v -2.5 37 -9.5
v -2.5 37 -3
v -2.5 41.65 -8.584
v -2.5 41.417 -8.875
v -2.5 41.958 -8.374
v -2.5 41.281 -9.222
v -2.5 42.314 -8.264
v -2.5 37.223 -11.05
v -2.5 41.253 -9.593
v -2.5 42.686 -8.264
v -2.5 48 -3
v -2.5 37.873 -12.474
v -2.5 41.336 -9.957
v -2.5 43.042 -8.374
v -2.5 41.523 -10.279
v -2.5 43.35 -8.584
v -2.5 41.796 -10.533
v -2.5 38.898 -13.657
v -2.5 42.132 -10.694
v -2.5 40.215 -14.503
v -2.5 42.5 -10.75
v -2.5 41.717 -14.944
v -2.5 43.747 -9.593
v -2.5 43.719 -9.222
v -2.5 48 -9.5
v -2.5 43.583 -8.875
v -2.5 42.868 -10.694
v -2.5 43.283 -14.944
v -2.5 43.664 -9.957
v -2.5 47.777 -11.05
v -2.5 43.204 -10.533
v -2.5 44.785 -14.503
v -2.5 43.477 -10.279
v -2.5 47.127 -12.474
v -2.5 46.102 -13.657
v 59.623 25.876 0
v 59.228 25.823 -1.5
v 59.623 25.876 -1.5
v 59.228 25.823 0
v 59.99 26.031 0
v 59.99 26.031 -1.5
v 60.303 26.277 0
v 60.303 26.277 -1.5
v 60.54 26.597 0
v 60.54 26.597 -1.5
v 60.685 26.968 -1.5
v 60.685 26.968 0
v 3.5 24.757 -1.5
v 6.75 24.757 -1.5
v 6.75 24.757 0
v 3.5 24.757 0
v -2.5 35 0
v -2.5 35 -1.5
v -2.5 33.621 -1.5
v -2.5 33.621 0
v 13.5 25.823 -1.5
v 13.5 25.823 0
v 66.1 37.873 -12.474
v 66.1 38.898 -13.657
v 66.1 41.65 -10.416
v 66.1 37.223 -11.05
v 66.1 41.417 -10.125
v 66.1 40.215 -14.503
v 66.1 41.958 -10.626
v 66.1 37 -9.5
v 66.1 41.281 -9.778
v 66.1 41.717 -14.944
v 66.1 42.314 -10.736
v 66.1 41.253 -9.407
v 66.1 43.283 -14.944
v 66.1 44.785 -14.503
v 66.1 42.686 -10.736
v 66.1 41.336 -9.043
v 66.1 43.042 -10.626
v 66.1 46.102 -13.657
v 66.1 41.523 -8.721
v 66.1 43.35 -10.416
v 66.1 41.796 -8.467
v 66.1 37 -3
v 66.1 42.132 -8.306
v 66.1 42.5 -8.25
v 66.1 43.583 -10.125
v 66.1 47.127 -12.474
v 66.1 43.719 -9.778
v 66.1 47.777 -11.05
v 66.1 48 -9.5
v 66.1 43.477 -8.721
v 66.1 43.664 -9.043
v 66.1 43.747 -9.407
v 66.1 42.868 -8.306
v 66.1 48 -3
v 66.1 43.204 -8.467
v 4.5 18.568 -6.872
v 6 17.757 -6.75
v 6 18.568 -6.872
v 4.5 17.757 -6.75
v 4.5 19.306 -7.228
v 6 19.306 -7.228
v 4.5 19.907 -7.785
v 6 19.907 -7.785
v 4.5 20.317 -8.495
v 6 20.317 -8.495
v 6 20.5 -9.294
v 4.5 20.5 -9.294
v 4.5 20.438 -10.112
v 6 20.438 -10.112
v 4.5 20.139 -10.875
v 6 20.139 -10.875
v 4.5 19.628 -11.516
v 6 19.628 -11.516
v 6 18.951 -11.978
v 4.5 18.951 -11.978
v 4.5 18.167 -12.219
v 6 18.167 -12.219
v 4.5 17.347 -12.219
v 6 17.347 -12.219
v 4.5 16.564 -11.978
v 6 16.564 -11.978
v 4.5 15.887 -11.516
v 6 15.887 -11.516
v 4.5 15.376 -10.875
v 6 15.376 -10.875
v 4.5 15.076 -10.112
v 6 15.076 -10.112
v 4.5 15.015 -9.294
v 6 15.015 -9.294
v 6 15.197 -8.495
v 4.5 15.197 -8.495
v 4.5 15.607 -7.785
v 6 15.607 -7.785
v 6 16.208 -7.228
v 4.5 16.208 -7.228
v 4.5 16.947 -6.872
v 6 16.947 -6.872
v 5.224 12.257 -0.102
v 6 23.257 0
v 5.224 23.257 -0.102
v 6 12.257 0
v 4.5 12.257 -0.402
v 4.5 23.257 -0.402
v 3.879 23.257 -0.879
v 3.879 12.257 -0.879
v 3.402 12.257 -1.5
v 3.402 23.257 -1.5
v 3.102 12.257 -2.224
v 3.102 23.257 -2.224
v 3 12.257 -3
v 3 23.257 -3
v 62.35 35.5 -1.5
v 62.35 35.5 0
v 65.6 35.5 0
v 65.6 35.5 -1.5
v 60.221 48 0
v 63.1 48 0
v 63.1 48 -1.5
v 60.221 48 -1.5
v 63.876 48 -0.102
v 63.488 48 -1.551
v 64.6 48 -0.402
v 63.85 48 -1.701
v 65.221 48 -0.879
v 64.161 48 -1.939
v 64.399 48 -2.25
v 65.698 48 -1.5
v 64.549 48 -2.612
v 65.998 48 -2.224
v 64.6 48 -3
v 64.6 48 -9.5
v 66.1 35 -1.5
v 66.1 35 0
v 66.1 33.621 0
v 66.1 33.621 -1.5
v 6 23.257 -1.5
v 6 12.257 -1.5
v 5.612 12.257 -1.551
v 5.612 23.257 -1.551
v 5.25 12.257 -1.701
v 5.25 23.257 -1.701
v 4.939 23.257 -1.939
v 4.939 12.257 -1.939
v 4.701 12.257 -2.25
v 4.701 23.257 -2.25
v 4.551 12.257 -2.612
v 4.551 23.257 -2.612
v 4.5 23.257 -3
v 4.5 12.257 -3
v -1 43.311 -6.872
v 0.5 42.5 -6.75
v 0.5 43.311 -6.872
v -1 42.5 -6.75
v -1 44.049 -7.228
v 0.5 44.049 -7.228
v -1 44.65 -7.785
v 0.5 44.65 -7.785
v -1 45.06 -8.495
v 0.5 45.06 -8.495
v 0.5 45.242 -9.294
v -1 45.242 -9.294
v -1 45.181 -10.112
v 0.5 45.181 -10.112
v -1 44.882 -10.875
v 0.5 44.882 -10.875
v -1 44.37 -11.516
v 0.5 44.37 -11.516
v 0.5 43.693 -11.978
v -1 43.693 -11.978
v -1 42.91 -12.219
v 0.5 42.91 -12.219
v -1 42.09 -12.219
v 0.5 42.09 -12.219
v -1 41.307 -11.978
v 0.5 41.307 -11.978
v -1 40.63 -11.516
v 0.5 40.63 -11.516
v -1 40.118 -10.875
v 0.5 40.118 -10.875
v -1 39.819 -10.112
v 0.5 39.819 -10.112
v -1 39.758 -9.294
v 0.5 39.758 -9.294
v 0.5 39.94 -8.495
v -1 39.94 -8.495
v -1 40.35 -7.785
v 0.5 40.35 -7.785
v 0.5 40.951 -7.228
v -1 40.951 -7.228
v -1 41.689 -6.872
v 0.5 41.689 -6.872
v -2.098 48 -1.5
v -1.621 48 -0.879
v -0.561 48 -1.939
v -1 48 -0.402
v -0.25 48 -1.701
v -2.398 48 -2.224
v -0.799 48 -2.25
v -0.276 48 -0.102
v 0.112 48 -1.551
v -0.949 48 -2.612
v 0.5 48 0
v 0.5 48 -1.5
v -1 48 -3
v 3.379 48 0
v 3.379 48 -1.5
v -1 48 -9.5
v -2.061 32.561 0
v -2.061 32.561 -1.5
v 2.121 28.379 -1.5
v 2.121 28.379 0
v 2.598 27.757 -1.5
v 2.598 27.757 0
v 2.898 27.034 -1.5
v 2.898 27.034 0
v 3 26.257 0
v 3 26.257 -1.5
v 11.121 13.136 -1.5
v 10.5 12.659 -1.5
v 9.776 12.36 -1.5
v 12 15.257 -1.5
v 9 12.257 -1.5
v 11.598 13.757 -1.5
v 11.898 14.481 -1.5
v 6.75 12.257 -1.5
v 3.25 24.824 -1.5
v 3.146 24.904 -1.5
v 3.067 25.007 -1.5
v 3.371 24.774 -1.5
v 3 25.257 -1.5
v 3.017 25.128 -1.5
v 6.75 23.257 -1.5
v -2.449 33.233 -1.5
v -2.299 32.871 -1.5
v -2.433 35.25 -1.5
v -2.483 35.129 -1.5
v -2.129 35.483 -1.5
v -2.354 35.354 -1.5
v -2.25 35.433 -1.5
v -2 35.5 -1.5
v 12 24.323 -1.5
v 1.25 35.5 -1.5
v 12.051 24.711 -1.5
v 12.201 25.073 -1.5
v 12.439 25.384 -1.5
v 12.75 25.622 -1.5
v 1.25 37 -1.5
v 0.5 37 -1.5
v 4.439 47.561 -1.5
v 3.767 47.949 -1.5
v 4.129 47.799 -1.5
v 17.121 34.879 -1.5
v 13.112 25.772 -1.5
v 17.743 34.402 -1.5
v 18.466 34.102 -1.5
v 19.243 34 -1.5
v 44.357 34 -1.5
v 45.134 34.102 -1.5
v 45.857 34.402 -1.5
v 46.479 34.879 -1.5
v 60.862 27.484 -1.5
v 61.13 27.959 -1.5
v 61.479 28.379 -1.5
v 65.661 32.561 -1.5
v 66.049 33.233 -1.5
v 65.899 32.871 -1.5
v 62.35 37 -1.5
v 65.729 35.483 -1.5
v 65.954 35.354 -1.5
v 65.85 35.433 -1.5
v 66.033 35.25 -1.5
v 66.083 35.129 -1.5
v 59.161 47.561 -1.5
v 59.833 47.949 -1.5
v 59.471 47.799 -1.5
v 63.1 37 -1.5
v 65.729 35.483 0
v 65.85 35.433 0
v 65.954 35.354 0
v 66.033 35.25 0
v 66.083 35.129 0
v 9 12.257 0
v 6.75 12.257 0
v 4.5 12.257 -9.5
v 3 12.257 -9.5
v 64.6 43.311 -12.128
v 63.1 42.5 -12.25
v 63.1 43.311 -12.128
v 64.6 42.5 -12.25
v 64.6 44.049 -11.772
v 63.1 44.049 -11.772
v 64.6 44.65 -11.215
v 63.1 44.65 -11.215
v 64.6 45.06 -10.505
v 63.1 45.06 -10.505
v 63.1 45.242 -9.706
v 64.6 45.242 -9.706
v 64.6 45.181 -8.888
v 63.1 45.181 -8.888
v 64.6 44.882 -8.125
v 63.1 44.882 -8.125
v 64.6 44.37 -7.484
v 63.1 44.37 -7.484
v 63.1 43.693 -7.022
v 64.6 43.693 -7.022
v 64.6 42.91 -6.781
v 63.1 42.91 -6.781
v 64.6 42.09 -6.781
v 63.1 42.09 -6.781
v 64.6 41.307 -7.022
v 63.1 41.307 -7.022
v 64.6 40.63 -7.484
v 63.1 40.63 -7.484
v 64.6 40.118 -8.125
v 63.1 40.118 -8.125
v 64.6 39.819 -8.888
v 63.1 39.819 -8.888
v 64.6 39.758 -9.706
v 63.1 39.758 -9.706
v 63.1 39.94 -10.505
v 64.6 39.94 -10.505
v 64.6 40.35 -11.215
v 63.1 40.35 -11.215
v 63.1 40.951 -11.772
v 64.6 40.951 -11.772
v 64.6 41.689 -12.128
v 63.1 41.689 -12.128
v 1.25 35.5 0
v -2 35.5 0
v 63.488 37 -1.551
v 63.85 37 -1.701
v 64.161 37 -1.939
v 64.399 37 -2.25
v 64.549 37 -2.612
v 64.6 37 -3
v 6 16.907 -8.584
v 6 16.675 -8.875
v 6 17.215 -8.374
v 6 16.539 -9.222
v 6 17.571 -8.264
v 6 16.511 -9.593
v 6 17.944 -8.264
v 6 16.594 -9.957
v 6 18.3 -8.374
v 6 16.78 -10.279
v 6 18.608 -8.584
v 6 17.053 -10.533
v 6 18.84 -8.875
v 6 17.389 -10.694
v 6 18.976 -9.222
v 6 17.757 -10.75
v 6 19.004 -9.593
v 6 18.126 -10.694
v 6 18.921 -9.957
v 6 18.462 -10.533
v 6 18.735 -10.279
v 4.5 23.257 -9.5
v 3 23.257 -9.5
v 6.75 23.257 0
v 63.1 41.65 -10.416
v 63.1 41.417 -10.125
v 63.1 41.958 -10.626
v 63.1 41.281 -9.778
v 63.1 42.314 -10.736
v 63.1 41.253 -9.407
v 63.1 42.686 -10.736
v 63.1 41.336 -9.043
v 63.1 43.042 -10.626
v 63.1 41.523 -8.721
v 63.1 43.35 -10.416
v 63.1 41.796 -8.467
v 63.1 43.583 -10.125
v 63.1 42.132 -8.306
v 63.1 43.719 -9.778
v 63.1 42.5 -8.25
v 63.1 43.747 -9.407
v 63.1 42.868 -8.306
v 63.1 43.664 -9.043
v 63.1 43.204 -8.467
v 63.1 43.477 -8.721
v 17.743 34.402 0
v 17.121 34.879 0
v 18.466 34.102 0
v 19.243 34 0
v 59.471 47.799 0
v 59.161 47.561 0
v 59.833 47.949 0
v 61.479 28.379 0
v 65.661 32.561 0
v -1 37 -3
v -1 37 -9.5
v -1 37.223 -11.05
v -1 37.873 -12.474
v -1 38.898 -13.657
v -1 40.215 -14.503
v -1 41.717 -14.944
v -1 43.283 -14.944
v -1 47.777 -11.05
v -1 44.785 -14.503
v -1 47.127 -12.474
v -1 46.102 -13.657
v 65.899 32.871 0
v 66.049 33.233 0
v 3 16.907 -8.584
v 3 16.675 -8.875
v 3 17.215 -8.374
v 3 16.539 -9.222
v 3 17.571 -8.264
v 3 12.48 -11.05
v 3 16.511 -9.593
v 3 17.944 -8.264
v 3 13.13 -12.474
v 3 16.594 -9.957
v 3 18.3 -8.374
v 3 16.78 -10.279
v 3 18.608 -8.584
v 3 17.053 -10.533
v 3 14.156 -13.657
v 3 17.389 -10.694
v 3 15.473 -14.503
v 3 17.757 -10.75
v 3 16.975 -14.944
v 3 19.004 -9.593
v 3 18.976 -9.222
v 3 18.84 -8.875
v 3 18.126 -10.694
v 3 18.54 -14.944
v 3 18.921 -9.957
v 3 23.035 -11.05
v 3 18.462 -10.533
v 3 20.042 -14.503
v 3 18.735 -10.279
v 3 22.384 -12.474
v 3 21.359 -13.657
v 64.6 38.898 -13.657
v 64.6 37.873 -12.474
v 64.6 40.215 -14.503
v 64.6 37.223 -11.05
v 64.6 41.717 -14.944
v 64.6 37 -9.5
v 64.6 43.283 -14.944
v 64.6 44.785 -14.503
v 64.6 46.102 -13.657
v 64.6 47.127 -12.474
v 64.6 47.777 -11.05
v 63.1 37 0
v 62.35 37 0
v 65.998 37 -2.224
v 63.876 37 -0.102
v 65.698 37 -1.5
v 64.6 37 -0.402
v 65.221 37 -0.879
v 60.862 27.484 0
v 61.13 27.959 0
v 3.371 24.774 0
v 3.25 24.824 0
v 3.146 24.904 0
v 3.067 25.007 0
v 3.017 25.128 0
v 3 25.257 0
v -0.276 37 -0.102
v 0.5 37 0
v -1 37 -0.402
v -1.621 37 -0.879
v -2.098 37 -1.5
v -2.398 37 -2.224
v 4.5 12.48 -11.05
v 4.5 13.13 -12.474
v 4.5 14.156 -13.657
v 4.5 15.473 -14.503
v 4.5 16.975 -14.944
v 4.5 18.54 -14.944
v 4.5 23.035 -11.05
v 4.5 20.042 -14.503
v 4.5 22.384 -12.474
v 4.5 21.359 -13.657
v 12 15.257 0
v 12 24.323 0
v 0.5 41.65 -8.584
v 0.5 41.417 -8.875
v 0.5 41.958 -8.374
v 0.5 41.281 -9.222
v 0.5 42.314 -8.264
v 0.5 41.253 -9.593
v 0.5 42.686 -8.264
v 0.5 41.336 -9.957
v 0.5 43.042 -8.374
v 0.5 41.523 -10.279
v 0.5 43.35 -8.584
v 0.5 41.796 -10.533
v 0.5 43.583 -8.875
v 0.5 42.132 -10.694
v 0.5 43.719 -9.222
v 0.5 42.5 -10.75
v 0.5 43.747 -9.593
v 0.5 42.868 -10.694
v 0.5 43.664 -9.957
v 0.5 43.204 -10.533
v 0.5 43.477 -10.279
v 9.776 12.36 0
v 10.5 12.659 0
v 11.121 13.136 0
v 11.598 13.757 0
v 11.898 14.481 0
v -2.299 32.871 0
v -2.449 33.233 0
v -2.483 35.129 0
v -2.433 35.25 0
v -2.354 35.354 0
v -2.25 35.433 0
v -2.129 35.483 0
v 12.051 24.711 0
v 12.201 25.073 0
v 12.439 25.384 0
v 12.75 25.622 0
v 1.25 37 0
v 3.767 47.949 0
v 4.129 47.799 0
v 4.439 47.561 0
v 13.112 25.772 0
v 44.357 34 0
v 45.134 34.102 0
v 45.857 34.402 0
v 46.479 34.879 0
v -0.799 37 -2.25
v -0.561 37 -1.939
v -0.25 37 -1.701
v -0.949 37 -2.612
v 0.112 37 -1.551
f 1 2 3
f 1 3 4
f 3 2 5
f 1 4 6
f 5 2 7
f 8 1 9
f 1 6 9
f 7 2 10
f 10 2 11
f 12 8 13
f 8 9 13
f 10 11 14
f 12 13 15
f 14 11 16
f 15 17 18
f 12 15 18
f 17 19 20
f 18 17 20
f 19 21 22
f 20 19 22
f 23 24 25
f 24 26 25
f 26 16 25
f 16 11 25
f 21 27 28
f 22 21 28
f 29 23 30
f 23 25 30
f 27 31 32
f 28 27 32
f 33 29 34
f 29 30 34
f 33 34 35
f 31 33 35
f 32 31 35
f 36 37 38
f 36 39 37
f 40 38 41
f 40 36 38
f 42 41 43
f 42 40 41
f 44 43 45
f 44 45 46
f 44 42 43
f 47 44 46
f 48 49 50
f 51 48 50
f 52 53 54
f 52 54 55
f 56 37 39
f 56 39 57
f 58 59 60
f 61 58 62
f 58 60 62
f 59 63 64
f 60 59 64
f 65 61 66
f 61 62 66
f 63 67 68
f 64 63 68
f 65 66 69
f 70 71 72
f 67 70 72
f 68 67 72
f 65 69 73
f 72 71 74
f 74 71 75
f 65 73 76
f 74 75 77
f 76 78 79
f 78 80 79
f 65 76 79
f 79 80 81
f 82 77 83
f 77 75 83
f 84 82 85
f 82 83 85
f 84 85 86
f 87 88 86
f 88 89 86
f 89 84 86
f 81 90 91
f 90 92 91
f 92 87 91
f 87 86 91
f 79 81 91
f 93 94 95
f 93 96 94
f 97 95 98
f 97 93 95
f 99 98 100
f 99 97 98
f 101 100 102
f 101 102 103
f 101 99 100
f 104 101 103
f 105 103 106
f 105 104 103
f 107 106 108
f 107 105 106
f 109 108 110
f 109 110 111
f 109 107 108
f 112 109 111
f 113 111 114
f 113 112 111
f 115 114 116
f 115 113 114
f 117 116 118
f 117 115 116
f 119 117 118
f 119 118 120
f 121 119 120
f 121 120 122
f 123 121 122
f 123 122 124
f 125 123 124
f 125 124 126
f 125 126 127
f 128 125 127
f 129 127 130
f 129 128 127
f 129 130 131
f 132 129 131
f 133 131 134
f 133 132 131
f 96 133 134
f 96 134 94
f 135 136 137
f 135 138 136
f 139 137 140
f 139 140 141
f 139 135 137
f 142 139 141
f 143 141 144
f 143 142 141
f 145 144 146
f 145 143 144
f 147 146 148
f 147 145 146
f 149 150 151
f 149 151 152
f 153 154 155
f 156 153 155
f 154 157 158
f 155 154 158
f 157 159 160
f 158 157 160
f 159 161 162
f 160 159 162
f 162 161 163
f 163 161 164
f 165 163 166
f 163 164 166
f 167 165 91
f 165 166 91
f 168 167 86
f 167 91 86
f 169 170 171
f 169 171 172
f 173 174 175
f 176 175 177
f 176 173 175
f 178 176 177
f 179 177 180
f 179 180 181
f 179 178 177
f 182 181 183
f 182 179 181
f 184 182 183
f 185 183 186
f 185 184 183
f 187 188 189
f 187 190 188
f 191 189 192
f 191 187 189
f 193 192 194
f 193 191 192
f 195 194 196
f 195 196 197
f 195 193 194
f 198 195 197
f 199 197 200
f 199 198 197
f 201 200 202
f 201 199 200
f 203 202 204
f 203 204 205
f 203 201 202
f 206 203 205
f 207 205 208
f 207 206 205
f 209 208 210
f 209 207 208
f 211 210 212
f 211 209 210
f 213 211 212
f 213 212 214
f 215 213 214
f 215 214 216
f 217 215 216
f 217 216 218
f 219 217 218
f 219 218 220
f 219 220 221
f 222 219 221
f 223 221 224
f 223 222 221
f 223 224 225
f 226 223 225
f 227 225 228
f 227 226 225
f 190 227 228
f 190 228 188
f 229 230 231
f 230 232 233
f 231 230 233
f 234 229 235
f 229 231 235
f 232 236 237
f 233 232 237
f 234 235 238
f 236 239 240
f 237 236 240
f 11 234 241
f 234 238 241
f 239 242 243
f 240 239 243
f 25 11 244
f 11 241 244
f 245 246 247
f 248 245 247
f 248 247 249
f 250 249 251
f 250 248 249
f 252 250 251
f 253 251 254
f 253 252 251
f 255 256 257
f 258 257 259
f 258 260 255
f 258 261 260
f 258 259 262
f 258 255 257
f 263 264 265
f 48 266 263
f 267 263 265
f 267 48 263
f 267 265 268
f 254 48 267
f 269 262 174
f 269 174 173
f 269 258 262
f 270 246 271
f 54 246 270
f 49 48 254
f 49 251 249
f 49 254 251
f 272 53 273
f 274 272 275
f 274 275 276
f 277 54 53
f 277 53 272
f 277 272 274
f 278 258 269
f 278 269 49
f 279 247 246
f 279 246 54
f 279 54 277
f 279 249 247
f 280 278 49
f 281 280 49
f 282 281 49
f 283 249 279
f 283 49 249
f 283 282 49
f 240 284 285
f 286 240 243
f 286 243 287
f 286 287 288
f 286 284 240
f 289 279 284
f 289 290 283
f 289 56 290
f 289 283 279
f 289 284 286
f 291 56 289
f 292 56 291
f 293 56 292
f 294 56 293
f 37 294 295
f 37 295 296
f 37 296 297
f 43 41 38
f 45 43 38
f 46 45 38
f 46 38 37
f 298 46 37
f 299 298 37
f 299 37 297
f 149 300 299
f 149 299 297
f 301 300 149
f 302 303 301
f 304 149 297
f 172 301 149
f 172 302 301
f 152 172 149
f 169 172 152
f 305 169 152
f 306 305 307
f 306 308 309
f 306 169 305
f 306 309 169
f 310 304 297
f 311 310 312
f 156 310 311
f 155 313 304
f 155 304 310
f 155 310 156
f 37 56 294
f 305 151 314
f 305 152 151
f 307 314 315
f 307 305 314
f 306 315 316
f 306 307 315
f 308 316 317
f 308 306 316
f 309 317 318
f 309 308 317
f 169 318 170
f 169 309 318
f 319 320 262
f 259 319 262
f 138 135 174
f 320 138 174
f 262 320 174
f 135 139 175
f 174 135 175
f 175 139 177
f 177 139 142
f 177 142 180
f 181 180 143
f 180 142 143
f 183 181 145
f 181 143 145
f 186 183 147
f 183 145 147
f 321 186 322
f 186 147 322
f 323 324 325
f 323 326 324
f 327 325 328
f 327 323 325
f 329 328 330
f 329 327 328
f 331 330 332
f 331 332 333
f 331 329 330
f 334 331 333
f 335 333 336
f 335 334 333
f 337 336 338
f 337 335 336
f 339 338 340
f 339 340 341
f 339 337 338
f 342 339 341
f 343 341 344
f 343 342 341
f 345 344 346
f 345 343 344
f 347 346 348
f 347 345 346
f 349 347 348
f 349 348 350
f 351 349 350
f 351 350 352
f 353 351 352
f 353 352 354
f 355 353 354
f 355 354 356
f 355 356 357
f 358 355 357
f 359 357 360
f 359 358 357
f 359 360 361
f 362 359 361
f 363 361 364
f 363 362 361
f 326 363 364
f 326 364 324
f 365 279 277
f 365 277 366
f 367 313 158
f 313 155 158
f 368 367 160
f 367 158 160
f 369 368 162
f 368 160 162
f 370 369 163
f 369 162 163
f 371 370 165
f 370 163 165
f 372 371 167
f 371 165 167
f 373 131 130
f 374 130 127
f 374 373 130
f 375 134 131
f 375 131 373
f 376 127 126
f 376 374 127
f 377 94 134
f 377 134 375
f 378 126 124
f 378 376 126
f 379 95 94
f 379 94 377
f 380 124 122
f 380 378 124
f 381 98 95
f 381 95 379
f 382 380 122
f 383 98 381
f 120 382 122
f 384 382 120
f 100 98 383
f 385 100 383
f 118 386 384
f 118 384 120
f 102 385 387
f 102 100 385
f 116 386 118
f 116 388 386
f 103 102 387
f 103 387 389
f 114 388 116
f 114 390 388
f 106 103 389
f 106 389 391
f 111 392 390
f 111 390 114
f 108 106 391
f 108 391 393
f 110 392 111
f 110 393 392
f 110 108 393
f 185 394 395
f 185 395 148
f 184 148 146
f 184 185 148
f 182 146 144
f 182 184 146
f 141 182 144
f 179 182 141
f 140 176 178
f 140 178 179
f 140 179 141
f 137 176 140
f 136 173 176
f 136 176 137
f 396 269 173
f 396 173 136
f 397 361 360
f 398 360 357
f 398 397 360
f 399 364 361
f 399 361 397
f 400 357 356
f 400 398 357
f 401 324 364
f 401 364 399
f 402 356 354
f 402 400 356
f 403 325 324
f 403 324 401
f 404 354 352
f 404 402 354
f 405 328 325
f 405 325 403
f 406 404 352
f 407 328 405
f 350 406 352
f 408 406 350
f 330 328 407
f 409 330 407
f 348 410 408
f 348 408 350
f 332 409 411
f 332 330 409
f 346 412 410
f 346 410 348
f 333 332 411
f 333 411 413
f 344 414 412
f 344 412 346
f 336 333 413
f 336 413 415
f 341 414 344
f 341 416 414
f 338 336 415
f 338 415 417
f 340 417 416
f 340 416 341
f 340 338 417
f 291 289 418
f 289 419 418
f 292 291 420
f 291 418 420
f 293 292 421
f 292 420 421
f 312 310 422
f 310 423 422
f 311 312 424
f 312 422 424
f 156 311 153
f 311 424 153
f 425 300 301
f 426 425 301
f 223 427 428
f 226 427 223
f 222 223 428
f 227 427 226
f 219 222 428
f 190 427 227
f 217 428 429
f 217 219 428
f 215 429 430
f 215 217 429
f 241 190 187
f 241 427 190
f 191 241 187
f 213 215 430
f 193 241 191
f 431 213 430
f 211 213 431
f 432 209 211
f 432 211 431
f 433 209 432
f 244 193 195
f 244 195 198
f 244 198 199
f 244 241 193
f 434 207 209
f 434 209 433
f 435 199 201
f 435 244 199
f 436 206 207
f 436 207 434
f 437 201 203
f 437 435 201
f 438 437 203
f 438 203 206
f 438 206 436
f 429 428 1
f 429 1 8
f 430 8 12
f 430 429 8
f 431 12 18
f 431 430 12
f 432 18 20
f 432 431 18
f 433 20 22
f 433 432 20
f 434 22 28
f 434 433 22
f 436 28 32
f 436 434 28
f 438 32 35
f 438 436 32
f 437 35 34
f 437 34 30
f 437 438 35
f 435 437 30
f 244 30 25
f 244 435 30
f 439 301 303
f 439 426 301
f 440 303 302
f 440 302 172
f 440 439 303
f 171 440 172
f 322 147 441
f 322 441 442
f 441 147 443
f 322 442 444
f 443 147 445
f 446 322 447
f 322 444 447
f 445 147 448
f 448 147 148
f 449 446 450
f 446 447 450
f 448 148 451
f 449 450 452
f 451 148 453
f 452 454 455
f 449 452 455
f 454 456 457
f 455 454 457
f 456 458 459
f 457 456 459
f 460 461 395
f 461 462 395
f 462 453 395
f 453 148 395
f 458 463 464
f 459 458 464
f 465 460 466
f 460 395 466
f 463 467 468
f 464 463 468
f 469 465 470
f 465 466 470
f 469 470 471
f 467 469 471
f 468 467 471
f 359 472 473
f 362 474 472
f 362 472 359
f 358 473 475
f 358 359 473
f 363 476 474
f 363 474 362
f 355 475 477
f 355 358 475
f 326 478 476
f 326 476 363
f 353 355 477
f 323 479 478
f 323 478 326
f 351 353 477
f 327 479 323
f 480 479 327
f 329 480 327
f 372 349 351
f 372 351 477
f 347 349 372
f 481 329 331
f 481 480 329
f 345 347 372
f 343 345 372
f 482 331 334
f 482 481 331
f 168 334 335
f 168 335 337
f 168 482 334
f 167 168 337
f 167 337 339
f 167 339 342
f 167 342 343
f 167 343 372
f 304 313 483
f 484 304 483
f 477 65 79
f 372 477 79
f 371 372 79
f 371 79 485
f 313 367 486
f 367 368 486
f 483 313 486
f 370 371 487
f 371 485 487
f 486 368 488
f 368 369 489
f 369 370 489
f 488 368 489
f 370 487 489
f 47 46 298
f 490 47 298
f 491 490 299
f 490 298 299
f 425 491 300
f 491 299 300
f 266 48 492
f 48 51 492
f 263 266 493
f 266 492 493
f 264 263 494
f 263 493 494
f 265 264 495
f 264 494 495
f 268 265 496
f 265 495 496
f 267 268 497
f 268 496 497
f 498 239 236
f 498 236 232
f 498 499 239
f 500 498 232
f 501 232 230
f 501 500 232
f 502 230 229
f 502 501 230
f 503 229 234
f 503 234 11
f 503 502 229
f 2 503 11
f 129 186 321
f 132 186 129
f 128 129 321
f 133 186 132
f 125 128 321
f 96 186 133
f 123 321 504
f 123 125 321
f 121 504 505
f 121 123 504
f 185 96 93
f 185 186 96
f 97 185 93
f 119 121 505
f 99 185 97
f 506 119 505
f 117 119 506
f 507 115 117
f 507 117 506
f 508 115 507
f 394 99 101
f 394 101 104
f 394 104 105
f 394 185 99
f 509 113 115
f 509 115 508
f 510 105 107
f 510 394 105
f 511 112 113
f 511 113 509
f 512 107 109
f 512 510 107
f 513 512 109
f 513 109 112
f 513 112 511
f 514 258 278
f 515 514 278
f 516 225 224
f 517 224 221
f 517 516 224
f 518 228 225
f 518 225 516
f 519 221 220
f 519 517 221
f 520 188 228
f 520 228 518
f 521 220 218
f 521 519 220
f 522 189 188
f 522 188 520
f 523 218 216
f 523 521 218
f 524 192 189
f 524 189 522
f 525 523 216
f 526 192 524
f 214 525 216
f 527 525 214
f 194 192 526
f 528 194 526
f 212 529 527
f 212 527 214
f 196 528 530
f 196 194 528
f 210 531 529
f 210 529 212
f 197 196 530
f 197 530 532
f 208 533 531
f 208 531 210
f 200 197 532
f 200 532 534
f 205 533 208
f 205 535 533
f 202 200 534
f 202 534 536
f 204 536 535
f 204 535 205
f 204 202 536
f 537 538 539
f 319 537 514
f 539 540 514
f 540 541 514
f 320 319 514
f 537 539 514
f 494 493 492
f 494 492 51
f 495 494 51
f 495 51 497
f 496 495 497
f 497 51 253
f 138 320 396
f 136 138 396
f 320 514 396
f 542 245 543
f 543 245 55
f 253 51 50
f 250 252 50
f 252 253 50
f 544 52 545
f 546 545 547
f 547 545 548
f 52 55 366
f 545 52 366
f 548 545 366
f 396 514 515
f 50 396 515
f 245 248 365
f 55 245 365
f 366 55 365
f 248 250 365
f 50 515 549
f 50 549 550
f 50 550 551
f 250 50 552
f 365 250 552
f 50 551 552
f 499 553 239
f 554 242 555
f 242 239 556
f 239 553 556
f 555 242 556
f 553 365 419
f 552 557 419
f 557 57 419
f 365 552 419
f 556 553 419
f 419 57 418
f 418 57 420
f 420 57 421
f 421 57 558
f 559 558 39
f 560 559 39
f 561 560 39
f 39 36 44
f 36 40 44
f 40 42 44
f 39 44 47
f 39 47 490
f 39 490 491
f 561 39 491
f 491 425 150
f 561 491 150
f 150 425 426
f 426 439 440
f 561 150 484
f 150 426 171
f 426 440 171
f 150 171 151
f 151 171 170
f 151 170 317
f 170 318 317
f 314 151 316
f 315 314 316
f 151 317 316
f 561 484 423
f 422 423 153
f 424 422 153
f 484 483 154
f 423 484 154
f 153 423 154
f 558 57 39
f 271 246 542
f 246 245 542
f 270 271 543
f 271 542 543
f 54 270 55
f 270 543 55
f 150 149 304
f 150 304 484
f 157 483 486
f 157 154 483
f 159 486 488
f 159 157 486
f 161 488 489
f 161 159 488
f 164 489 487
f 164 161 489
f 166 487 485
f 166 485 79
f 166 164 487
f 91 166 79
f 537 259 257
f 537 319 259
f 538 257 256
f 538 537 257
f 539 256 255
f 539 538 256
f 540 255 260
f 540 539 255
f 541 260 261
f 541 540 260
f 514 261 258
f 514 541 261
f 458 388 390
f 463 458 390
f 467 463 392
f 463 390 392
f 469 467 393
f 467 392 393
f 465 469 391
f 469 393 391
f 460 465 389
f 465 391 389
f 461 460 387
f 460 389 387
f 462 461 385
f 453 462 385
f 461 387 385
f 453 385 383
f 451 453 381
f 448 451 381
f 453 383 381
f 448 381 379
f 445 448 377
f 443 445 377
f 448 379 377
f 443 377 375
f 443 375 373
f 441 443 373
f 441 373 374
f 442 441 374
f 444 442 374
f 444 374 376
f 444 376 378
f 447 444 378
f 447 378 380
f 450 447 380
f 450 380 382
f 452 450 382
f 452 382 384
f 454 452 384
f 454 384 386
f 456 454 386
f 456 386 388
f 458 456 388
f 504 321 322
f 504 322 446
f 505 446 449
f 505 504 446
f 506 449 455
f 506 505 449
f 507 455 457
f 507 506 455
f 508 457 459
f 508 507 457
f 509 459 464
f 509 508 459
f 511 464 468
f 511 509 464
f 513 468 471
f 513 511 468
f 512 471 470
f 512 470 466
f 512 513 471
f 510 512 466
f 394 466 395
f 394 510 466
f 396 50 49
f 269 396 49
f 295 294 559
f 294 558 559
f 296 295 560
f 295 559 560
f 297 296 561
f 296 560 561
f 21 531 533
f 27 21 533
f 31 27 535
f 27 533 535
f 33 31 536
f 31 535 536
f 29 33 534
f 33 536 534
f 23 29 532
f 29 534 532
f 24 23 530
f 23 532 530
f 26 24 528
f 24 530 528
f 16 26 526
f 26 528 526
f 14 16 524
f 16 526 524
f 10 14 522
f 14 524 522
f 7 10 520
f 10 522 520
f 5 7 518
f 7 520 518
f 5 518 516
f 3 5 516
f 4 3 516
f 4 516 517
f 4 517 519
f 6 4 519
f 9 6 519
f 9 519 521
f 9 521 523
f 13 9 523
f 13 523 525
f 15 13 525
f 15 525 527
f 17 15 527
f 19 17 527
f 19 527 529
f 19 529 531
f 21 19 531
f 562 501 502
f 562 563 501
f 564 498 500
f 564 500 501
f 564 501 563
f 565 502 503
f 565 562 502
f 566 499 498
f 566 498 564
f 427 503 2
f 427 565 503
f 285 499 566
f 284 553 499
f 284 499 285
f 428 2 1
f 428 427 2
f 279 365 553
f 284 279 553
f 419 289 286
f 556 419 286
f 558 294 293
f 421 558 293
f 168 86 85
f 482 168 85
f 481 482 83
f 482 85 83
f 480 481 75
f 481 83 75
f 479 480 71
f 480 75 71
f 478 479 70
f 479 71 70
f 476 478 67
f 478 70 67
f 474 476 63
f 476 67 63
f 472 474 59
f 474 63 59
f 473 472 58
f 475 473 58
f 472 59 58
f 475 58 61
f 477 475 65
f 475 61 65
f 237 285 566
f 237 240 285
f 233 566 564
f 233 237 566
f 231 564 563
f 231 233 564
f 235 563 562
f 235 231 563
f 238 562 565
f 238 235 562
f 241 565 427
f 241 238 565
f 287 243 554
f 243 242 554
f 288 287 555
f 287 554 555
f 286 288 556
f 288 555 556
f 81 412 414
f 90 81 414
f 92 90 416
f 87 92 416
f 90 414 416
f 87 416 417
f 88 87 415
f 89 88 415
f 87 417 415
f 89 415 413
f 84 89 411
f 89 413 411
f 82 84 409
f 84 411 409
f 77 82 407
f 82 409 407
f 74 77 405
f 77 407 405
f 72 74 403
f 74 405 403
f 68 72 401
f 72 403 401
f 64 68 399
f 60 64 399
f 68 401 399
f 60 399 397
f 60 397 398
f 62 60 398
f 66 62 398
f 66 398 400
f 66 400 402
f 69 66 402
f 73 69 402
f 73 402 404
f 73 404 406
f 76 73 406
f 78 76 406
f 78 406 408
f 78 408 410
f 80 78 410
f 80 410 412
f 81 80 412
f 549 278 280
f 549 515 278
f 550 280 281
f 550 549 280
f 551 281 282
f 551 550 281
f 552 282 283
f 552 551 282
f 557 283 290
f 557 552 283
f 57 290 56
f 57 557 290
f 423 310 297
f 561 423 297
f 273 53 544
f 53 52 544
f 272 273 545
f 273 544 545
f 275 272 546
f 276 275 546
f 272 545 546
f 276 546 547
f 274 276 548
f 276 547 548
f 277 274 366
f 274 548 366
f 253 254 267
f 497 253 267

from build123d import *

# Parameters (mm, degrees)
SKETCH_1_W                  = 5.5
SKETCH_1_H                  = 12.242640687
EXTRUDE_1_DEPTH             = 1.5
SKETCH_2_W                  = 1.5
SKETCH_2_H                  = 24.742640687
EXTRUDE_2_DEPTH             = 55.6
SKETCH_3_W                  = 1.5
SKETCH_3_H                  = 11
EXTRUDE_3_DEPTH             = 2.25
SKETCH_4_W                  = 63.35
SKETCH_4_H                  = 1.5
EXTRUDE_4_DEPTH             = 11
EXTRUDE_5_DEPTH             = 1.5
EXTRUDE_6_DEPTH             = 1.5
SKETCH_7_W                  = 1.5
SKETCH_7_H                  = 11
EXTRUDE_7_DEPTH             = 2.25
EXTRUDE_START               = 1.5
EXTRUDE_8_DEPTH             = 1.5
SKETCH_9_W                  = 1.5
SKETCH_9_H                  = 23.242640687
EXTRUDE_9_DEPTH             = 3.75
SKETCH_10_W                 = 1.5
SKETCH_10_H                 = 10.742640687
EXTRUDE_10_DEPTH            = 3.75
CUT_EXTRUDE_1_DEPTH         = 83.797705282
SKETCH_12_W                 = 54.1
SKETCH_12_H                 = 13.565555211
CUT_EXTRUDE_2_DEPTH         = 83.797705282
CUT_EXTRUDE_3_DEPTH         = 83.797705282
CUT_EXTRUDE_4_DEPTH         = 83.797705282
SKETCH_15_W                 = 1.5
SKETCH_15_H                 = 2.75
SKETCH_16_W                 = 1.5
SKETCH_16_H                 = 2.75
SKETCH_17_W                 = 1.5
SKETCH_17_H                 = 2.75
HOLE_WIZARD_2_5_2_5_1_D     = 2.5
HOLE_WIZARD_2_5_2_5_1_DEPTH = 63.1
HOLE_WIZARD_2_5_2_5_2_D     = 2.5
HOLE_WIZARD_2_5_2_5_2_DEPTH = 3
HOLE_WIZARD_2_5_2_5_3_D     = 2.5
HOLE_WIZARD_2_5_2_5_3_DEPTH = 68.6
FILLET_1_R                  = 0.5
FILLET_2_R                  = 1.5
FILLET_3_R                  = 3


with BuildPart() as part:
    # 草图1 → 凸台-拉伸1 (new body)
    with BuildSketch(Plane.XY):
        with Locations((4, 30.878679657)):
            Rectangle(SKETCH_1_W, SKETCH_1_H)
    extrude(amount=-EXTRUDE_1_DEPTH)

    # 草图2 → 凸台-拉伸2 (add)
    with BuildSketch(Plane(origin=(6.75, 0, 0), x_dir=(0, 0, -1), z_dir=(1, 0, 0))):
        with Locations((0.75, 24.628679657)):
            Rectangle(SKETCH_2_W, SKETCH_2_H)
    extrude(amount=EXTRUDE_2_DEPTH)

    # 草图3 → 凸台-拉伸3 (add)
    with BuildSketch(Plane.ZY.offset(-6.75)):
        with Locations((-0.75, 17.757359313)):
            Rectangle(SKETCH_3_W, SKETCH_3_H)
    extrude(amount=EXTRUDE_3_DEPTH)

    # 草图4 → 凸台-拉伸4 (add)
    with BuildSketch(Plane(origin=(0, 37, 0), x_dir=(-1, 0, 0), z_dir=(0, 1, 0))):
        with Locations((-30.675, -0.75)):
            Rectangle(SKETCH_4_W, SKETCH_4_H)
    extrude(amount=EXTRUDE_4_DEPTH)

    # 草图5 → 凸台-拉伸5 (add)
    with BuildSketch(Plane.ZY.offset(1)):
        with BuildLine():
            Line((-9.5, 48), (0, 48))
            Line((0, 48), (0, 37))
            Line((0, 37), (-9.5, 37))
            ThreePointArc((-9.5, 37), (-15, 42.5), (-9.5, 48))
        make_face()
    extrude(amount=EXTRUDE_5_DEPTH)

    # 草图6 → 凸台-拉伸6 (add)
    with BuildSketch(Plane.ZY.offset(-4.5)):
        with BuildLine():
            Line((-9.5, 23.257359313), (0, 23.257359313))
            Line((0, 23.257359313), (0, 12.257359313))
            Line((0, 12.257359313), (-9.5, 12.257359313))
            ThreePointArc((-9.5, 12.257359313), (-15, 17.757359313), (-9.5, 23.257359313))
        make_face()
    extrude(amount=EXTRUDE_6_DEPTH)

    # 草图7 → 凸台-拉伸7 (add)
    with BuildSketch(Plane(origin=(62.35, 0, 0), x_dir=(0, 0, -1), z_dir=(1, 0, 0))):
        with Locations((0.75, 42.5)):
            Rectangle(SKETCH_7_W, SKETCH_7_H)
    extrude(amount=EXTRUDE_7_DEPTH)

    # 草图8 → 凸台-拉伸8 (add)
    with BuildSketch(Plane(origin=(64.6, 0, 0), x_dir=(0, 0, -1), z_dir=(1, 0, 0)).offset(EXTRUDE_START)):
        with BuildLine():
            Line((9.5, 37), (0, 37))
            Line((0, 37), (0, 48))
            Line((0, 48), (9.5, 48))
            ThreePointArc((9.5, 48), (15, 42.5), (9.5, 37))
        make_face()
    extrude(amount=-EXTRUDE_8_DEPTH)

    # 草图9 → 凸台-拉伸9 (add)
    with BuildSketch(Plane(origin=(62.35, 0, 0), x_dir=(0, 0, -1), z_dir=(1, 0, 0))):
        with Locations((0.75, 23.878679657)):
            Rectangle(SKETCH_9_W, SKETCH_9_H)
    extrude(amount=EXTRUDE_9_DEPTH)

    # 草图10 → 凸台-拉伸10 (add)
    with BuildSketch(Plane.ZY.offset(-1.25)):
        with Locations((-0.75, 30.128679657)):
            Rectangle(SKETCH_10_W, SKETCH_10_H)
    extrude(amount=EXTRUDE_10_DEPTH)

    # 草图11 → 切除-拉伸1 (cut, through all)
    with BuildSketch(Plane(origin=(0, 0, -1.5), x_dir=(-1, 0, 0), z_dir=(0, 0, -1))):
        Polygon((2.5, 24.757359313), (2.5, 33), (-3, 27.5), (-3, 24.757359313), align=None)
    extrude(amount=-CUT_EXTRUDE_1_DEPTH, mode=Mode.SUBTRACT)

    # 草图12 → 切除-拉伸2 (cut, through all)
    with BuildSketch(Plane(origin=(0, 0, -1.5), x_dir=(-1, 0, 0), z_dir=(0, 0, -1))):
        with Locations((-39.05, 19.040136919)):
            Rectangle(SKETCH_12_W, SKETCH_12_H)
    extrude(amount=-CUT_EXTRUDE_2_DEPTH, mode=Mode.SUBTRACT)

    # 草图13 → 切除-拉伸3 (cut, through all)
    with BuildSketch(Plane(origin=(0, 0, -1.5), x_dir=(-1, 0, 0), z_dir=(0, 0, -1))):
        with BuildLine():
            Line((-61.478679656, 28.378679656), (-66.1, 33))
            Line((-66.1, 33), (-66.1, 25.822914524))
            Line((-66.1, 25.822914524), (-60.631623722, 25.822914524))
            ThreePointArc((-60.631623722, 25.822914524), (-60.752327832, 27.201161847), (-61.478679656, 28.378679656))
        make_face()
    extrude(amount=-CUT_EXTRUDE_3_DEPTH, mode=Mode.SUBTRACT)

    # 草图14 → 切除-拉伸4 (cut, through all)
    with BuildSketch(Plane(origin=(0, 0, -1.5), x_dir=(-1, 0, 0), z_dir=(0, 0, -1))):
        Polygon((-59.6, 48), (-45.6, 34), (-18, 34), (-4, 48), align=None)
    extrude(amount=-CUT_EXTRUDE_4_DEPTH, mode=Mode.SUBTRACT)

    # 草图15 → 旋转1 (revolve)
    with BuildSketch(Plane(origin=(0, 0, -9.5), x_dir=(-1, 0, 0), z_dir=(0, 0, -1)), mode=Mode.PRIVATE) as revolve_1_sk:
        with Locations((-5.25, 19.132359313)):
            Rectangle(SKETCH_15_W, SKETCH_15_H)
    revolve(revolve_1_sk.sketch.rotate(Axis((6, 17.757359313, -9.5), (-1, 0, 0)), 270), axis=Axis((6, 17.757359313, -9.5), (-1, 0, 0)))

    # 草图16 → 旋转2 (revolve)
    with BuildSketch(Plane(origin=(0, 0, -9.5), x_dir=(-1, 0, 0), z_dir=(0, 0, -1)), mode=Mode.PRIVATE) as revolve_2_sk:
        with Locations((0.25, 43.875)):
            Rectangle(SKETCH_16_W, SKETCH_16_H)
    revolve(revolve_2_sk.sketch.rotate(Axis((0.5, 42.5, -9.5), (-1, 0, 0)), 270), axis=Axis((0.5, 42.5, -9.5), (-1, 0, 0)))

    # 草图17 → 旋转3 (revolve)
    with BuildSketch(Plane.XY.offset(-9.5), mode=Mode.PRIVATE) as revolve_3_sk:
        with Locations((63.85, 43.875)):
            Rectangle(SKETCH_17_W, SKETCH_17_H)
    revolve(revolve_3_sk.sketch.rotate(Axis((63.1, 42.5, -9.5), (1, 0, 0)), 270), axis=Axis((63.1, 42.5, -9.5), (1, 0, 0)))

    # Ø2.5 (2.5) 直径孔1
    with Locations(Plane.ZY.offset(-3)):
        with Locations((-9.5, 17.757359313)):
            Hole(HOLE_WIZARD_2_5_2_5_1_D / 2, depth=HOLE_WIZARD_2_5_2_5_1_DEPTH)

    # Ø2.5 (2.5) 直径孔2
    with Locations(Plane.ZY.offset(2.5)):
        with Locations((-9.5, 42.5)):
            Hole(HOLE_WIZARD_2_5_2_5_2_D / 2, depth=HOLE_WIZARD_2_5_2_5_2_DEPTH)

    # Ø2.5 (2.5) 直径孔3
    with Locations(Plane(origin=(66.1, 0, 0), x_dir=(0, 0, -1), z_dir=(1, 0, 0))):
        with Locations((9.5, 42.5)):
            Hole(HOLE_WIZARD_2_5_2_5_3_D / 2, depth=HOLE_WIZARD_2_5_2_5_3_DEPTH)

    # 圆角1
    fillet_1_edges = [part.edges().sort_by_distance(p)[0] for p in [
        (66.1, 35.5, -0.75),
        (-2.5, 35.5, -0.75),
        (3, 24.757359313, -0.75),
    ]]
    fillet(fillet_1_edges, radius=FILLET_1_R)

    # 圆角2
    fillet_2_edges = [part.edges().sort_by_distance(p)[0] for p in [
        (-2.5, 33, -0.75),
        (12, 25.822914524, -0.75),
        (60.631623722, 25.822914524, -0.75),
        (66.1, 33, -0.75),
        (59.6, 48, -0.75),
        (4, 48, -0.75),
        (4.5, 17.757359313, -1.5),
        (-1, 42.5, -1.5),
        (64.6, 42.5, -1.5),
    ]]
    fillet(fillet_2_edges, radius=FILLET_2_R)

    # 圆角3
    fillet_3_edges = [part.edges().sort_by_distance(p)[0] for p in [
        (66.1, 42.5, 0),
        (18, 34, -0.75),
        (45.6, 34, -0.75),
        (3, 27.5, -0.75),
        (12, 12.257359313, -0.75),
        (3, 17.757359313, 0),
        (-2.5, 42.5, 0),
    ]]
    fillet(fillet_3_edges, radius=FILLET_3_R)


solid = part.part
